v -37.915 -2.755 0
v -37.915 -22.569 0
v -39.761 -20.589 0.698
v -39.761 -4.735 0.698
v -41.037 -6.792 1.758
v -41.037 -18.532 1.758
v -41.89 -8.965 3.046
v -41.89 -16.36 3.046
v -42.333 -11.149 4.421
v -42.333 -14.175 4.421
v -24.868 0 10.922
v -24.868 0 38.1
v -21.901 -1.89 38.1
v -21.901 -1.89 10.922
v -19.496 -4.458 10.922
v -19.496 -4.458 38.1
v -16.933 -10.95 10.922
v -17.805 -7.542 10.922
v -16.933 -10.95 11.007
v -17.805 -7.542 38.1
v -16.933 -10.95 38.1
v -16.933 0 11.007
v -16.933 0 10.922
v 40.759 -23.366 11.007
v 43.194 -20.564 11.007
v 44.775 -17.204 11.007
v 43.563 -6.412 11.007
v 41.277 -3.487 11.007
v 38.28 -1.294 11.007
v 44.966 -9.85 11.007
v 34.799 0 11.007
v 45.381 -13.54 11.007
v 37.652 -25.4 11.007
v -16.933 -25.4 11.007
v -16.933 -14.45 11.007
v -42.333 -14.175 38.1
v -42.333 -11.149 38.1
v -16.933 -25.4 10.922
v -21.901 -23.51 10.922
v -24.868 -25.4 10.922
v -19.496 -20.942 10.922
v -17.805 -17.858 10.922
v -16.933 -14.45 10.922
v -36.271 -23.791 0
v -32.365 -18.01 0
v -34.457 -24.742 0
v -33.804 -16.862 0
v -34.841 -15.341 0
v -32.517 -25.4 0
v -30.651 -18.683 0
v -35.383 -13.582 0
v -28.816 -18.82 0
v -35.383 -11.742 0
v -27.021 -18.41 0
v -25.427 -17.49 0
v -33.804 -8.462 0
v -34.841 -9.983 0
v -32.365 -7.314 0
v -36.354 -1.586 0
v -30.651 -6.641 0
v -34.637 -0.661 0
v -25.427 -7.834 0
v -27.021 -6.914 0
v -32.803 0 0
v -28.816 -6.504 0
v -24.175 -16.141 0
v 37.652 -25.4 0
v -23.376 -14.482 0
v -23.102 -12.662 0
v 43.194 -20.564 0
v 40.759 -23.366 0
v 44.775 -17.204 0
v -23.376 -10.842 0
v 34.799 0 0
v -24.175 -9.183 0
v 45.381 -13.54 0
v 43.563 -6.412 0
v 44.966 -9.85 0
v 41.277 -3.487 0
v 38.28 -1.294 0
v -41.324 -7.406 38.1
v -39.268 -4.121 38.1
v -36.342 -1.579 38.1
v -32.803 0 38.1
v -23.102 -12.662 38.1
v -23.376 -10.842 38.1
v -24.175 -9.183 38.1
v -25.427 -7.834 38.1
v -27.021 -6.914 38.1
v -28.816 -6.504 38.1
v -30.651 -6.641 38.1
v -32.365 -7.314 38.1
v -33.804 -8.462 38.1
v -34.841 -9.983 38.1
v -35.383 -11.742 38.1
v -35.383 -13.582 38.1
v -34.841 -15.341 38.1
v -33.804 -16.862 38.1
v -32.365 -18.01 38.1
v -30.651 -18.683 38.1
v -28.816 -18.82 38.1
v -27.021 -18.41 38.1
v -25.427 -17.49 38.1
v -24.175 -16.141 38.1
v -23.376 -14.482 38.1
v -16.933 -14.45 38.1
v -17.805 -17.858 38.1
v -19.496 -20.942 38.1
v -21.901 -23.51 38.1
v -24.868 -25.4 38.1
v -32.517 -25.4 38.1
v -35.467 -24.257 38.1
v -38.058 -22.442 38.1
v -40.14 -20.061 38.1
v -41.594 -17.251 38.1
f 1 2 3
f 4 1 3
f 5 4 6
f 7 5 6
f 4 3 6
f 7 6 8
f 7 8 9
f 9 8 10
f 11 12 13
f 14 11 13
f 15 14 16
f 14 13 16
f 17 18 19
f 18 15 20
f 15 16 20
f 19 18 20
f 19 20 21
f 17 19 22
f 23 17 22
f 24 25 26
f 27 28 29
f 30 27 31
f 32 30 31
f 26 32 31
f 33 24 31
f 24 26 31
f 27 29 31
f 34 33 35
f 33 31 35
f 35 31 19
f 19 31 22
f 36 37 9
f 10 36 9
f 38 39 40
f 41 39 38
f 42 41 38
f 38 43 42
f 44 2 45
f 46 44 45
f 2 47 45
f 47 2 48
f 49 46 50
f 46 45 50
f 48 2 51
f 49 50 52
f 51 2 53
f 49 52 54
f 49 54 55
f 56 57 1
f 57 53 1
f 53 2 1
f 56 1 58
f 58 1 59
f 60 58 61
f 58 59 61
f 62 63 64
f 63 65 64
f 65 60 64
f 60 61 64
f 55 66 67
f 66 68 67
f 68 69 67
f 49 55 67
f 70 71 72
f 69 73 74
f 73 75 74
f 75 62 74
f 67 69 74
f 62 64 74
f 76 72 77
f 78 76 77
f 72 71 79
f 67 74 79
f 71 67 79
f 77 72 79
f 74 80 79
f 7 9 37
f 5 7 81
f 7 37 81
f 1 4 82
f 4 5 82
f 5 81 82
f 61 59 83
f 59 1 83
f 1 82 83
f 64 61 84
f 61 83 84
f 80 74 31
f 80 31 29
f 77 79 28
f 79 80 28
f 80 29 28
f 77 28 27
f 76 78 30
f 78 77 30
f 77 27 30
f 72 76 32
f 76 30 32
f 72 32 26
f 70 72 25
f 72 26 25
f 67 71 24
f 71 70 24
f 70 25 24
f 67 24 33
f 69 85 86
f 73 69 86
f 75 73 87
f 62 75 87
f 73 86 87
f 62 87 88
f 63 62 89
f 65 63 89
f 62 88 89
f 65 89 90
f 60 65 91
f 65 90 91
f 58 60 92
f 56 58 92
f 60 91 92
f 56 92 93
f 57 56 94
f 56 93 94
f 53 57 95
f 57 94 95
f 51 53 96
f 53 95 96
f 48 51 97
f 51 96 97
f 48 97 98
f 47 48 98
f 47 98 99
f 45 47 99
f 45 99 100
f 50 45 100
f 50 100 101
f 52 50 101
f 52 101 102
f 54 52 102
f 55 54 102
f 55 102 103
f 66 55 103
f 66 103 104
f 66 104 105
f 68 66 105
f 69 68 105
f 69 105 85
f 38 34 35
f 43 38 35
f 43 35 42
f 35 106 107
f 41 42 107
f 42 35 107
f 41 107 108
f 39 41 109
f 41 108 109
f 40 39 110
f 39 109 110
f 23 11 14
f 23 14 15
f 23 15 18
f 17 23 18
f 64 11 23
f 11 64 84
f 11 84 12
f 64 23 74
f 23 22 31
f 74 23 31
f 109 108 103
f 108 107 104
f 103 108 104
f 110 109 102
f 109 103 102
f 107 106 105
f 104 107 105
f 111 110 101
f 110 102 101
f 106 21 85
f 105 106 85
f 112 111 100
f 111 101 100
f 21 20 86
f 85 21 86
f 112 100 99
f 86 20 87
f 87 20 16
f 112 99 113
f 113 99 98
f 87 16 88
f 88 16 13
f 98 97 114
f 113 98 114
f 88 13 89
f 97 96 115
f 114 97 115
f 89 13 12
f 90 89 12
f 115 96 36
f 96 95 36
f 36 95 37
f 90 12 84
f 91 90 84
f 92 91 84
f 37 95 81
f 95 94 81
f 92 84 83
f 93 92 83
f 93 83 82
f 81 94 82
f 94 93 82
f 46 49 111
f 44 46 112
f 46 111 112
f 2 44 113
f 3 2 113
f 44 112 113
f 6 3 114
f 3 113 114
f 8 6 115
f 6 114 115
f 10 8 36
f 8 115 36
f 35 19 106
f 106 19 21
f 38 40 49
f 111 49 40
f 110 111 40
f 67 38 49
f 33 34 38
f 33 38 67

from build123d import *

# Parameters (mm, degrees)
F1_DEPTH  = 25.4
F3_DEPTH  = 25.4
F5_DEPTH  = 25.4
F7_DEPTH  = 25.4
F9_DEPTH  = 50.8
F11_DEPTH = 27.178
F13_DEPTH = 25.4
F14_R     = 6.1753595884
F15_DEPTH = 50.8


with BuildPart() as f1:
    # F0 (on Front) → F1 (new body)
    with BuildSketch(Plane.XZ):
        Polygon((-42.333334913, 38.1), (-42.333334913, 0), (46.566665087, 0), (46.566665087, 11.0066671406), (-16.933334913, 11.0066671406), (-16.933334913, 38.1), align=None)
    extrude(amount=F1_DEPTH)

    # F2 (on face) → F3 (cut)
    with BuildSketch(Plane.XZ.offset(25.4)):
        with BuildLine():
            ThreePointArc((-37.9148391216, 0), (-40.8140278818, 1.5211007742), (-42.333334913, 4.4212299399))
            Line((-42.333334913, 4.4212299399), (-42.333334913, 0))
            Line((-42.333334913, 0), (-37.9148391216, 0))
        make_face()
    extrude(amount=-F3_DEPTH, mode=Mode.SUBTRACT)

    # F4 (on face) → F5 (cut)
    with BuildSketch(Plane.XY.offset(11.0066671406)):
        with BuildLine():
            ThreePointArc((34.7993597388, 0), (45.3010079388, -11.6808324), (37.6517660916, -25.4))
            Line((37.6517660916, -25.4), (46.566665087, -25.4))
            Line((46.566665087, -25.4), (46.566665087, 0))
            Line((46.566665087, 0), (34.7993597388, 0))
        make_face()
    extrude(amount=-F5_DEPTH, mode=Mode.SUBTRACT)

    # F6 (on face) → F7 (cut)
    with BuildSketch(Plane.XY.offset(38.1)):
        with BuildLine():
            ThreePointArc((-16.933334913, -24.7742129951), (-12.9263389557, -18.5421251923), (-11.5236387204, -11.2670054659))
            ThreePointArc((-11.5236387204, -11.2670054659), (-49.0871210436, -3.583342718), (-17.5579703651, -25.4))
            Line((-17.5579703651, -25.4), (-42.333334913, -25.4))
            Line((-42.333334913, -25.4), (-42.333334913, 0))
            Line((-42.333334913, 0), (-16.933334913, 0))
            Line((-16.933334913, 0), (-16.933334913, -24.7742129951))
        make_face()
    extrude(amount=-F7_DEPTH, mode=Mode.SUBTRACT)

    # F8 (on face) → F9 (cut)
    with BuildSketch(Plane.XY.offset(38.1)):
        with BuildLine():
            ThreePointArc((-42.333334913, -11.1485840045), (-39.2676835177, -4.1212770864), (-32.8026749194, 0))
            Line((-32.8026749194, 0), (-42.333334913, 0))
            Line((-42.333334913, 0), (-42.333334913, -11.1485840045))
        make_face()
        with BuildLine():
            ThreePointArc((-32.5174331665, -25.4), (-39.1711473149, -21.3143901639), (-42.333334913, -14.1754344072))
            Line((-42.333334913, -14.1754344072), (-42.333334913, -25.4))
            Line((-42.333334913, -25.4), (-32.5174331665, -25.4))
        make_face()
    extrude(amount=-F9_DEPTH, mode=Mode.SUBTRACT)

    # F10 (on face) → F11 (cut)
    with BuildSketch(Plane.XY.offset(38.1)):
        with BuildLine():
            ThreePointArc((-24.8680049162, 0), (-19.4963079038, -4.4575302948), (-16.933334913, -10.95028584))
            Line((-16.933334913, -10.95028584), (-16.933334913, 0))
            Line((-16.933334913, 0), (-24.8680049162, 0))
        make_face()
        with BuildLine():
            ThreePointArc((-16.933334913, -14.44971416), (-19.4963079038, -20.9424697052), (-24.8680049162, -25.4))
            Line((-24.8680049162, -25.4), (-16.933334913, -25.4))
            Line((-16.933334913, -25.4), (-16.933334913, -14.44971416))
        make_face()
    extrude(amount=-F11_DEPTH, mode=Mode.SUBTRACT)

    # F12 (on face) → F13 (cut)
    with BuildSketch(Plane.XY.offset(11.0066671406)):
        with BuildLine():
            ThreePointArc((0, 2.0500258297), (-2.7772999757, 1.5187665416), (-5.1624582049, 0))
            Line((-5.1624582049, 0), (5.1624582049, 0))
            ThreePointArc((5.1624582049, 0), (2.7772999757, 1.5187665416), (0, 2.0500258297))
        make_face()
        with BuildLine():
            ThreePointArc((0, 2.0500258297), (2.7772999757, 1.5187665416), (5.1624582049, 0))
            Line((5.1624582049, 0), (15.1562278536, 0))
            ThreePointArc((15.1562278536, 0), (17.6040380518, 1.6191667448), (20.4805661222, 2.2014570285))
            Line((20.4805661222, 2.2014570285), (0, 2.0500258297))
        make_face()
        with BuildLine():
            ThreePointArc((20.4805661222, 2.2014570285), (17.6040380518, 1.6191667448), (15.1562278536, 0))
            Line((15.1562278536, 0), (25.9184243712, 0))
            ThreePointArc((25.9184243712, 0), (23.4180808332, 1.6406606681), (20.4805661222, 2.2014570285))
        make_face()
    extrude(amount=-F13_DEPTH, mode=Mode.SUBTRACT)

    # F14 (on face) → F15 (cut)
    with BuildSketch(Plane.XY.offset(38.1)):
        with Locations((-29.2770774571, -12.6620092059)):
            Circle(F14_R)
    extrude(amount=-F15_DEPTH, mode=Mode.SUBTRACT)


solid = f1.part
